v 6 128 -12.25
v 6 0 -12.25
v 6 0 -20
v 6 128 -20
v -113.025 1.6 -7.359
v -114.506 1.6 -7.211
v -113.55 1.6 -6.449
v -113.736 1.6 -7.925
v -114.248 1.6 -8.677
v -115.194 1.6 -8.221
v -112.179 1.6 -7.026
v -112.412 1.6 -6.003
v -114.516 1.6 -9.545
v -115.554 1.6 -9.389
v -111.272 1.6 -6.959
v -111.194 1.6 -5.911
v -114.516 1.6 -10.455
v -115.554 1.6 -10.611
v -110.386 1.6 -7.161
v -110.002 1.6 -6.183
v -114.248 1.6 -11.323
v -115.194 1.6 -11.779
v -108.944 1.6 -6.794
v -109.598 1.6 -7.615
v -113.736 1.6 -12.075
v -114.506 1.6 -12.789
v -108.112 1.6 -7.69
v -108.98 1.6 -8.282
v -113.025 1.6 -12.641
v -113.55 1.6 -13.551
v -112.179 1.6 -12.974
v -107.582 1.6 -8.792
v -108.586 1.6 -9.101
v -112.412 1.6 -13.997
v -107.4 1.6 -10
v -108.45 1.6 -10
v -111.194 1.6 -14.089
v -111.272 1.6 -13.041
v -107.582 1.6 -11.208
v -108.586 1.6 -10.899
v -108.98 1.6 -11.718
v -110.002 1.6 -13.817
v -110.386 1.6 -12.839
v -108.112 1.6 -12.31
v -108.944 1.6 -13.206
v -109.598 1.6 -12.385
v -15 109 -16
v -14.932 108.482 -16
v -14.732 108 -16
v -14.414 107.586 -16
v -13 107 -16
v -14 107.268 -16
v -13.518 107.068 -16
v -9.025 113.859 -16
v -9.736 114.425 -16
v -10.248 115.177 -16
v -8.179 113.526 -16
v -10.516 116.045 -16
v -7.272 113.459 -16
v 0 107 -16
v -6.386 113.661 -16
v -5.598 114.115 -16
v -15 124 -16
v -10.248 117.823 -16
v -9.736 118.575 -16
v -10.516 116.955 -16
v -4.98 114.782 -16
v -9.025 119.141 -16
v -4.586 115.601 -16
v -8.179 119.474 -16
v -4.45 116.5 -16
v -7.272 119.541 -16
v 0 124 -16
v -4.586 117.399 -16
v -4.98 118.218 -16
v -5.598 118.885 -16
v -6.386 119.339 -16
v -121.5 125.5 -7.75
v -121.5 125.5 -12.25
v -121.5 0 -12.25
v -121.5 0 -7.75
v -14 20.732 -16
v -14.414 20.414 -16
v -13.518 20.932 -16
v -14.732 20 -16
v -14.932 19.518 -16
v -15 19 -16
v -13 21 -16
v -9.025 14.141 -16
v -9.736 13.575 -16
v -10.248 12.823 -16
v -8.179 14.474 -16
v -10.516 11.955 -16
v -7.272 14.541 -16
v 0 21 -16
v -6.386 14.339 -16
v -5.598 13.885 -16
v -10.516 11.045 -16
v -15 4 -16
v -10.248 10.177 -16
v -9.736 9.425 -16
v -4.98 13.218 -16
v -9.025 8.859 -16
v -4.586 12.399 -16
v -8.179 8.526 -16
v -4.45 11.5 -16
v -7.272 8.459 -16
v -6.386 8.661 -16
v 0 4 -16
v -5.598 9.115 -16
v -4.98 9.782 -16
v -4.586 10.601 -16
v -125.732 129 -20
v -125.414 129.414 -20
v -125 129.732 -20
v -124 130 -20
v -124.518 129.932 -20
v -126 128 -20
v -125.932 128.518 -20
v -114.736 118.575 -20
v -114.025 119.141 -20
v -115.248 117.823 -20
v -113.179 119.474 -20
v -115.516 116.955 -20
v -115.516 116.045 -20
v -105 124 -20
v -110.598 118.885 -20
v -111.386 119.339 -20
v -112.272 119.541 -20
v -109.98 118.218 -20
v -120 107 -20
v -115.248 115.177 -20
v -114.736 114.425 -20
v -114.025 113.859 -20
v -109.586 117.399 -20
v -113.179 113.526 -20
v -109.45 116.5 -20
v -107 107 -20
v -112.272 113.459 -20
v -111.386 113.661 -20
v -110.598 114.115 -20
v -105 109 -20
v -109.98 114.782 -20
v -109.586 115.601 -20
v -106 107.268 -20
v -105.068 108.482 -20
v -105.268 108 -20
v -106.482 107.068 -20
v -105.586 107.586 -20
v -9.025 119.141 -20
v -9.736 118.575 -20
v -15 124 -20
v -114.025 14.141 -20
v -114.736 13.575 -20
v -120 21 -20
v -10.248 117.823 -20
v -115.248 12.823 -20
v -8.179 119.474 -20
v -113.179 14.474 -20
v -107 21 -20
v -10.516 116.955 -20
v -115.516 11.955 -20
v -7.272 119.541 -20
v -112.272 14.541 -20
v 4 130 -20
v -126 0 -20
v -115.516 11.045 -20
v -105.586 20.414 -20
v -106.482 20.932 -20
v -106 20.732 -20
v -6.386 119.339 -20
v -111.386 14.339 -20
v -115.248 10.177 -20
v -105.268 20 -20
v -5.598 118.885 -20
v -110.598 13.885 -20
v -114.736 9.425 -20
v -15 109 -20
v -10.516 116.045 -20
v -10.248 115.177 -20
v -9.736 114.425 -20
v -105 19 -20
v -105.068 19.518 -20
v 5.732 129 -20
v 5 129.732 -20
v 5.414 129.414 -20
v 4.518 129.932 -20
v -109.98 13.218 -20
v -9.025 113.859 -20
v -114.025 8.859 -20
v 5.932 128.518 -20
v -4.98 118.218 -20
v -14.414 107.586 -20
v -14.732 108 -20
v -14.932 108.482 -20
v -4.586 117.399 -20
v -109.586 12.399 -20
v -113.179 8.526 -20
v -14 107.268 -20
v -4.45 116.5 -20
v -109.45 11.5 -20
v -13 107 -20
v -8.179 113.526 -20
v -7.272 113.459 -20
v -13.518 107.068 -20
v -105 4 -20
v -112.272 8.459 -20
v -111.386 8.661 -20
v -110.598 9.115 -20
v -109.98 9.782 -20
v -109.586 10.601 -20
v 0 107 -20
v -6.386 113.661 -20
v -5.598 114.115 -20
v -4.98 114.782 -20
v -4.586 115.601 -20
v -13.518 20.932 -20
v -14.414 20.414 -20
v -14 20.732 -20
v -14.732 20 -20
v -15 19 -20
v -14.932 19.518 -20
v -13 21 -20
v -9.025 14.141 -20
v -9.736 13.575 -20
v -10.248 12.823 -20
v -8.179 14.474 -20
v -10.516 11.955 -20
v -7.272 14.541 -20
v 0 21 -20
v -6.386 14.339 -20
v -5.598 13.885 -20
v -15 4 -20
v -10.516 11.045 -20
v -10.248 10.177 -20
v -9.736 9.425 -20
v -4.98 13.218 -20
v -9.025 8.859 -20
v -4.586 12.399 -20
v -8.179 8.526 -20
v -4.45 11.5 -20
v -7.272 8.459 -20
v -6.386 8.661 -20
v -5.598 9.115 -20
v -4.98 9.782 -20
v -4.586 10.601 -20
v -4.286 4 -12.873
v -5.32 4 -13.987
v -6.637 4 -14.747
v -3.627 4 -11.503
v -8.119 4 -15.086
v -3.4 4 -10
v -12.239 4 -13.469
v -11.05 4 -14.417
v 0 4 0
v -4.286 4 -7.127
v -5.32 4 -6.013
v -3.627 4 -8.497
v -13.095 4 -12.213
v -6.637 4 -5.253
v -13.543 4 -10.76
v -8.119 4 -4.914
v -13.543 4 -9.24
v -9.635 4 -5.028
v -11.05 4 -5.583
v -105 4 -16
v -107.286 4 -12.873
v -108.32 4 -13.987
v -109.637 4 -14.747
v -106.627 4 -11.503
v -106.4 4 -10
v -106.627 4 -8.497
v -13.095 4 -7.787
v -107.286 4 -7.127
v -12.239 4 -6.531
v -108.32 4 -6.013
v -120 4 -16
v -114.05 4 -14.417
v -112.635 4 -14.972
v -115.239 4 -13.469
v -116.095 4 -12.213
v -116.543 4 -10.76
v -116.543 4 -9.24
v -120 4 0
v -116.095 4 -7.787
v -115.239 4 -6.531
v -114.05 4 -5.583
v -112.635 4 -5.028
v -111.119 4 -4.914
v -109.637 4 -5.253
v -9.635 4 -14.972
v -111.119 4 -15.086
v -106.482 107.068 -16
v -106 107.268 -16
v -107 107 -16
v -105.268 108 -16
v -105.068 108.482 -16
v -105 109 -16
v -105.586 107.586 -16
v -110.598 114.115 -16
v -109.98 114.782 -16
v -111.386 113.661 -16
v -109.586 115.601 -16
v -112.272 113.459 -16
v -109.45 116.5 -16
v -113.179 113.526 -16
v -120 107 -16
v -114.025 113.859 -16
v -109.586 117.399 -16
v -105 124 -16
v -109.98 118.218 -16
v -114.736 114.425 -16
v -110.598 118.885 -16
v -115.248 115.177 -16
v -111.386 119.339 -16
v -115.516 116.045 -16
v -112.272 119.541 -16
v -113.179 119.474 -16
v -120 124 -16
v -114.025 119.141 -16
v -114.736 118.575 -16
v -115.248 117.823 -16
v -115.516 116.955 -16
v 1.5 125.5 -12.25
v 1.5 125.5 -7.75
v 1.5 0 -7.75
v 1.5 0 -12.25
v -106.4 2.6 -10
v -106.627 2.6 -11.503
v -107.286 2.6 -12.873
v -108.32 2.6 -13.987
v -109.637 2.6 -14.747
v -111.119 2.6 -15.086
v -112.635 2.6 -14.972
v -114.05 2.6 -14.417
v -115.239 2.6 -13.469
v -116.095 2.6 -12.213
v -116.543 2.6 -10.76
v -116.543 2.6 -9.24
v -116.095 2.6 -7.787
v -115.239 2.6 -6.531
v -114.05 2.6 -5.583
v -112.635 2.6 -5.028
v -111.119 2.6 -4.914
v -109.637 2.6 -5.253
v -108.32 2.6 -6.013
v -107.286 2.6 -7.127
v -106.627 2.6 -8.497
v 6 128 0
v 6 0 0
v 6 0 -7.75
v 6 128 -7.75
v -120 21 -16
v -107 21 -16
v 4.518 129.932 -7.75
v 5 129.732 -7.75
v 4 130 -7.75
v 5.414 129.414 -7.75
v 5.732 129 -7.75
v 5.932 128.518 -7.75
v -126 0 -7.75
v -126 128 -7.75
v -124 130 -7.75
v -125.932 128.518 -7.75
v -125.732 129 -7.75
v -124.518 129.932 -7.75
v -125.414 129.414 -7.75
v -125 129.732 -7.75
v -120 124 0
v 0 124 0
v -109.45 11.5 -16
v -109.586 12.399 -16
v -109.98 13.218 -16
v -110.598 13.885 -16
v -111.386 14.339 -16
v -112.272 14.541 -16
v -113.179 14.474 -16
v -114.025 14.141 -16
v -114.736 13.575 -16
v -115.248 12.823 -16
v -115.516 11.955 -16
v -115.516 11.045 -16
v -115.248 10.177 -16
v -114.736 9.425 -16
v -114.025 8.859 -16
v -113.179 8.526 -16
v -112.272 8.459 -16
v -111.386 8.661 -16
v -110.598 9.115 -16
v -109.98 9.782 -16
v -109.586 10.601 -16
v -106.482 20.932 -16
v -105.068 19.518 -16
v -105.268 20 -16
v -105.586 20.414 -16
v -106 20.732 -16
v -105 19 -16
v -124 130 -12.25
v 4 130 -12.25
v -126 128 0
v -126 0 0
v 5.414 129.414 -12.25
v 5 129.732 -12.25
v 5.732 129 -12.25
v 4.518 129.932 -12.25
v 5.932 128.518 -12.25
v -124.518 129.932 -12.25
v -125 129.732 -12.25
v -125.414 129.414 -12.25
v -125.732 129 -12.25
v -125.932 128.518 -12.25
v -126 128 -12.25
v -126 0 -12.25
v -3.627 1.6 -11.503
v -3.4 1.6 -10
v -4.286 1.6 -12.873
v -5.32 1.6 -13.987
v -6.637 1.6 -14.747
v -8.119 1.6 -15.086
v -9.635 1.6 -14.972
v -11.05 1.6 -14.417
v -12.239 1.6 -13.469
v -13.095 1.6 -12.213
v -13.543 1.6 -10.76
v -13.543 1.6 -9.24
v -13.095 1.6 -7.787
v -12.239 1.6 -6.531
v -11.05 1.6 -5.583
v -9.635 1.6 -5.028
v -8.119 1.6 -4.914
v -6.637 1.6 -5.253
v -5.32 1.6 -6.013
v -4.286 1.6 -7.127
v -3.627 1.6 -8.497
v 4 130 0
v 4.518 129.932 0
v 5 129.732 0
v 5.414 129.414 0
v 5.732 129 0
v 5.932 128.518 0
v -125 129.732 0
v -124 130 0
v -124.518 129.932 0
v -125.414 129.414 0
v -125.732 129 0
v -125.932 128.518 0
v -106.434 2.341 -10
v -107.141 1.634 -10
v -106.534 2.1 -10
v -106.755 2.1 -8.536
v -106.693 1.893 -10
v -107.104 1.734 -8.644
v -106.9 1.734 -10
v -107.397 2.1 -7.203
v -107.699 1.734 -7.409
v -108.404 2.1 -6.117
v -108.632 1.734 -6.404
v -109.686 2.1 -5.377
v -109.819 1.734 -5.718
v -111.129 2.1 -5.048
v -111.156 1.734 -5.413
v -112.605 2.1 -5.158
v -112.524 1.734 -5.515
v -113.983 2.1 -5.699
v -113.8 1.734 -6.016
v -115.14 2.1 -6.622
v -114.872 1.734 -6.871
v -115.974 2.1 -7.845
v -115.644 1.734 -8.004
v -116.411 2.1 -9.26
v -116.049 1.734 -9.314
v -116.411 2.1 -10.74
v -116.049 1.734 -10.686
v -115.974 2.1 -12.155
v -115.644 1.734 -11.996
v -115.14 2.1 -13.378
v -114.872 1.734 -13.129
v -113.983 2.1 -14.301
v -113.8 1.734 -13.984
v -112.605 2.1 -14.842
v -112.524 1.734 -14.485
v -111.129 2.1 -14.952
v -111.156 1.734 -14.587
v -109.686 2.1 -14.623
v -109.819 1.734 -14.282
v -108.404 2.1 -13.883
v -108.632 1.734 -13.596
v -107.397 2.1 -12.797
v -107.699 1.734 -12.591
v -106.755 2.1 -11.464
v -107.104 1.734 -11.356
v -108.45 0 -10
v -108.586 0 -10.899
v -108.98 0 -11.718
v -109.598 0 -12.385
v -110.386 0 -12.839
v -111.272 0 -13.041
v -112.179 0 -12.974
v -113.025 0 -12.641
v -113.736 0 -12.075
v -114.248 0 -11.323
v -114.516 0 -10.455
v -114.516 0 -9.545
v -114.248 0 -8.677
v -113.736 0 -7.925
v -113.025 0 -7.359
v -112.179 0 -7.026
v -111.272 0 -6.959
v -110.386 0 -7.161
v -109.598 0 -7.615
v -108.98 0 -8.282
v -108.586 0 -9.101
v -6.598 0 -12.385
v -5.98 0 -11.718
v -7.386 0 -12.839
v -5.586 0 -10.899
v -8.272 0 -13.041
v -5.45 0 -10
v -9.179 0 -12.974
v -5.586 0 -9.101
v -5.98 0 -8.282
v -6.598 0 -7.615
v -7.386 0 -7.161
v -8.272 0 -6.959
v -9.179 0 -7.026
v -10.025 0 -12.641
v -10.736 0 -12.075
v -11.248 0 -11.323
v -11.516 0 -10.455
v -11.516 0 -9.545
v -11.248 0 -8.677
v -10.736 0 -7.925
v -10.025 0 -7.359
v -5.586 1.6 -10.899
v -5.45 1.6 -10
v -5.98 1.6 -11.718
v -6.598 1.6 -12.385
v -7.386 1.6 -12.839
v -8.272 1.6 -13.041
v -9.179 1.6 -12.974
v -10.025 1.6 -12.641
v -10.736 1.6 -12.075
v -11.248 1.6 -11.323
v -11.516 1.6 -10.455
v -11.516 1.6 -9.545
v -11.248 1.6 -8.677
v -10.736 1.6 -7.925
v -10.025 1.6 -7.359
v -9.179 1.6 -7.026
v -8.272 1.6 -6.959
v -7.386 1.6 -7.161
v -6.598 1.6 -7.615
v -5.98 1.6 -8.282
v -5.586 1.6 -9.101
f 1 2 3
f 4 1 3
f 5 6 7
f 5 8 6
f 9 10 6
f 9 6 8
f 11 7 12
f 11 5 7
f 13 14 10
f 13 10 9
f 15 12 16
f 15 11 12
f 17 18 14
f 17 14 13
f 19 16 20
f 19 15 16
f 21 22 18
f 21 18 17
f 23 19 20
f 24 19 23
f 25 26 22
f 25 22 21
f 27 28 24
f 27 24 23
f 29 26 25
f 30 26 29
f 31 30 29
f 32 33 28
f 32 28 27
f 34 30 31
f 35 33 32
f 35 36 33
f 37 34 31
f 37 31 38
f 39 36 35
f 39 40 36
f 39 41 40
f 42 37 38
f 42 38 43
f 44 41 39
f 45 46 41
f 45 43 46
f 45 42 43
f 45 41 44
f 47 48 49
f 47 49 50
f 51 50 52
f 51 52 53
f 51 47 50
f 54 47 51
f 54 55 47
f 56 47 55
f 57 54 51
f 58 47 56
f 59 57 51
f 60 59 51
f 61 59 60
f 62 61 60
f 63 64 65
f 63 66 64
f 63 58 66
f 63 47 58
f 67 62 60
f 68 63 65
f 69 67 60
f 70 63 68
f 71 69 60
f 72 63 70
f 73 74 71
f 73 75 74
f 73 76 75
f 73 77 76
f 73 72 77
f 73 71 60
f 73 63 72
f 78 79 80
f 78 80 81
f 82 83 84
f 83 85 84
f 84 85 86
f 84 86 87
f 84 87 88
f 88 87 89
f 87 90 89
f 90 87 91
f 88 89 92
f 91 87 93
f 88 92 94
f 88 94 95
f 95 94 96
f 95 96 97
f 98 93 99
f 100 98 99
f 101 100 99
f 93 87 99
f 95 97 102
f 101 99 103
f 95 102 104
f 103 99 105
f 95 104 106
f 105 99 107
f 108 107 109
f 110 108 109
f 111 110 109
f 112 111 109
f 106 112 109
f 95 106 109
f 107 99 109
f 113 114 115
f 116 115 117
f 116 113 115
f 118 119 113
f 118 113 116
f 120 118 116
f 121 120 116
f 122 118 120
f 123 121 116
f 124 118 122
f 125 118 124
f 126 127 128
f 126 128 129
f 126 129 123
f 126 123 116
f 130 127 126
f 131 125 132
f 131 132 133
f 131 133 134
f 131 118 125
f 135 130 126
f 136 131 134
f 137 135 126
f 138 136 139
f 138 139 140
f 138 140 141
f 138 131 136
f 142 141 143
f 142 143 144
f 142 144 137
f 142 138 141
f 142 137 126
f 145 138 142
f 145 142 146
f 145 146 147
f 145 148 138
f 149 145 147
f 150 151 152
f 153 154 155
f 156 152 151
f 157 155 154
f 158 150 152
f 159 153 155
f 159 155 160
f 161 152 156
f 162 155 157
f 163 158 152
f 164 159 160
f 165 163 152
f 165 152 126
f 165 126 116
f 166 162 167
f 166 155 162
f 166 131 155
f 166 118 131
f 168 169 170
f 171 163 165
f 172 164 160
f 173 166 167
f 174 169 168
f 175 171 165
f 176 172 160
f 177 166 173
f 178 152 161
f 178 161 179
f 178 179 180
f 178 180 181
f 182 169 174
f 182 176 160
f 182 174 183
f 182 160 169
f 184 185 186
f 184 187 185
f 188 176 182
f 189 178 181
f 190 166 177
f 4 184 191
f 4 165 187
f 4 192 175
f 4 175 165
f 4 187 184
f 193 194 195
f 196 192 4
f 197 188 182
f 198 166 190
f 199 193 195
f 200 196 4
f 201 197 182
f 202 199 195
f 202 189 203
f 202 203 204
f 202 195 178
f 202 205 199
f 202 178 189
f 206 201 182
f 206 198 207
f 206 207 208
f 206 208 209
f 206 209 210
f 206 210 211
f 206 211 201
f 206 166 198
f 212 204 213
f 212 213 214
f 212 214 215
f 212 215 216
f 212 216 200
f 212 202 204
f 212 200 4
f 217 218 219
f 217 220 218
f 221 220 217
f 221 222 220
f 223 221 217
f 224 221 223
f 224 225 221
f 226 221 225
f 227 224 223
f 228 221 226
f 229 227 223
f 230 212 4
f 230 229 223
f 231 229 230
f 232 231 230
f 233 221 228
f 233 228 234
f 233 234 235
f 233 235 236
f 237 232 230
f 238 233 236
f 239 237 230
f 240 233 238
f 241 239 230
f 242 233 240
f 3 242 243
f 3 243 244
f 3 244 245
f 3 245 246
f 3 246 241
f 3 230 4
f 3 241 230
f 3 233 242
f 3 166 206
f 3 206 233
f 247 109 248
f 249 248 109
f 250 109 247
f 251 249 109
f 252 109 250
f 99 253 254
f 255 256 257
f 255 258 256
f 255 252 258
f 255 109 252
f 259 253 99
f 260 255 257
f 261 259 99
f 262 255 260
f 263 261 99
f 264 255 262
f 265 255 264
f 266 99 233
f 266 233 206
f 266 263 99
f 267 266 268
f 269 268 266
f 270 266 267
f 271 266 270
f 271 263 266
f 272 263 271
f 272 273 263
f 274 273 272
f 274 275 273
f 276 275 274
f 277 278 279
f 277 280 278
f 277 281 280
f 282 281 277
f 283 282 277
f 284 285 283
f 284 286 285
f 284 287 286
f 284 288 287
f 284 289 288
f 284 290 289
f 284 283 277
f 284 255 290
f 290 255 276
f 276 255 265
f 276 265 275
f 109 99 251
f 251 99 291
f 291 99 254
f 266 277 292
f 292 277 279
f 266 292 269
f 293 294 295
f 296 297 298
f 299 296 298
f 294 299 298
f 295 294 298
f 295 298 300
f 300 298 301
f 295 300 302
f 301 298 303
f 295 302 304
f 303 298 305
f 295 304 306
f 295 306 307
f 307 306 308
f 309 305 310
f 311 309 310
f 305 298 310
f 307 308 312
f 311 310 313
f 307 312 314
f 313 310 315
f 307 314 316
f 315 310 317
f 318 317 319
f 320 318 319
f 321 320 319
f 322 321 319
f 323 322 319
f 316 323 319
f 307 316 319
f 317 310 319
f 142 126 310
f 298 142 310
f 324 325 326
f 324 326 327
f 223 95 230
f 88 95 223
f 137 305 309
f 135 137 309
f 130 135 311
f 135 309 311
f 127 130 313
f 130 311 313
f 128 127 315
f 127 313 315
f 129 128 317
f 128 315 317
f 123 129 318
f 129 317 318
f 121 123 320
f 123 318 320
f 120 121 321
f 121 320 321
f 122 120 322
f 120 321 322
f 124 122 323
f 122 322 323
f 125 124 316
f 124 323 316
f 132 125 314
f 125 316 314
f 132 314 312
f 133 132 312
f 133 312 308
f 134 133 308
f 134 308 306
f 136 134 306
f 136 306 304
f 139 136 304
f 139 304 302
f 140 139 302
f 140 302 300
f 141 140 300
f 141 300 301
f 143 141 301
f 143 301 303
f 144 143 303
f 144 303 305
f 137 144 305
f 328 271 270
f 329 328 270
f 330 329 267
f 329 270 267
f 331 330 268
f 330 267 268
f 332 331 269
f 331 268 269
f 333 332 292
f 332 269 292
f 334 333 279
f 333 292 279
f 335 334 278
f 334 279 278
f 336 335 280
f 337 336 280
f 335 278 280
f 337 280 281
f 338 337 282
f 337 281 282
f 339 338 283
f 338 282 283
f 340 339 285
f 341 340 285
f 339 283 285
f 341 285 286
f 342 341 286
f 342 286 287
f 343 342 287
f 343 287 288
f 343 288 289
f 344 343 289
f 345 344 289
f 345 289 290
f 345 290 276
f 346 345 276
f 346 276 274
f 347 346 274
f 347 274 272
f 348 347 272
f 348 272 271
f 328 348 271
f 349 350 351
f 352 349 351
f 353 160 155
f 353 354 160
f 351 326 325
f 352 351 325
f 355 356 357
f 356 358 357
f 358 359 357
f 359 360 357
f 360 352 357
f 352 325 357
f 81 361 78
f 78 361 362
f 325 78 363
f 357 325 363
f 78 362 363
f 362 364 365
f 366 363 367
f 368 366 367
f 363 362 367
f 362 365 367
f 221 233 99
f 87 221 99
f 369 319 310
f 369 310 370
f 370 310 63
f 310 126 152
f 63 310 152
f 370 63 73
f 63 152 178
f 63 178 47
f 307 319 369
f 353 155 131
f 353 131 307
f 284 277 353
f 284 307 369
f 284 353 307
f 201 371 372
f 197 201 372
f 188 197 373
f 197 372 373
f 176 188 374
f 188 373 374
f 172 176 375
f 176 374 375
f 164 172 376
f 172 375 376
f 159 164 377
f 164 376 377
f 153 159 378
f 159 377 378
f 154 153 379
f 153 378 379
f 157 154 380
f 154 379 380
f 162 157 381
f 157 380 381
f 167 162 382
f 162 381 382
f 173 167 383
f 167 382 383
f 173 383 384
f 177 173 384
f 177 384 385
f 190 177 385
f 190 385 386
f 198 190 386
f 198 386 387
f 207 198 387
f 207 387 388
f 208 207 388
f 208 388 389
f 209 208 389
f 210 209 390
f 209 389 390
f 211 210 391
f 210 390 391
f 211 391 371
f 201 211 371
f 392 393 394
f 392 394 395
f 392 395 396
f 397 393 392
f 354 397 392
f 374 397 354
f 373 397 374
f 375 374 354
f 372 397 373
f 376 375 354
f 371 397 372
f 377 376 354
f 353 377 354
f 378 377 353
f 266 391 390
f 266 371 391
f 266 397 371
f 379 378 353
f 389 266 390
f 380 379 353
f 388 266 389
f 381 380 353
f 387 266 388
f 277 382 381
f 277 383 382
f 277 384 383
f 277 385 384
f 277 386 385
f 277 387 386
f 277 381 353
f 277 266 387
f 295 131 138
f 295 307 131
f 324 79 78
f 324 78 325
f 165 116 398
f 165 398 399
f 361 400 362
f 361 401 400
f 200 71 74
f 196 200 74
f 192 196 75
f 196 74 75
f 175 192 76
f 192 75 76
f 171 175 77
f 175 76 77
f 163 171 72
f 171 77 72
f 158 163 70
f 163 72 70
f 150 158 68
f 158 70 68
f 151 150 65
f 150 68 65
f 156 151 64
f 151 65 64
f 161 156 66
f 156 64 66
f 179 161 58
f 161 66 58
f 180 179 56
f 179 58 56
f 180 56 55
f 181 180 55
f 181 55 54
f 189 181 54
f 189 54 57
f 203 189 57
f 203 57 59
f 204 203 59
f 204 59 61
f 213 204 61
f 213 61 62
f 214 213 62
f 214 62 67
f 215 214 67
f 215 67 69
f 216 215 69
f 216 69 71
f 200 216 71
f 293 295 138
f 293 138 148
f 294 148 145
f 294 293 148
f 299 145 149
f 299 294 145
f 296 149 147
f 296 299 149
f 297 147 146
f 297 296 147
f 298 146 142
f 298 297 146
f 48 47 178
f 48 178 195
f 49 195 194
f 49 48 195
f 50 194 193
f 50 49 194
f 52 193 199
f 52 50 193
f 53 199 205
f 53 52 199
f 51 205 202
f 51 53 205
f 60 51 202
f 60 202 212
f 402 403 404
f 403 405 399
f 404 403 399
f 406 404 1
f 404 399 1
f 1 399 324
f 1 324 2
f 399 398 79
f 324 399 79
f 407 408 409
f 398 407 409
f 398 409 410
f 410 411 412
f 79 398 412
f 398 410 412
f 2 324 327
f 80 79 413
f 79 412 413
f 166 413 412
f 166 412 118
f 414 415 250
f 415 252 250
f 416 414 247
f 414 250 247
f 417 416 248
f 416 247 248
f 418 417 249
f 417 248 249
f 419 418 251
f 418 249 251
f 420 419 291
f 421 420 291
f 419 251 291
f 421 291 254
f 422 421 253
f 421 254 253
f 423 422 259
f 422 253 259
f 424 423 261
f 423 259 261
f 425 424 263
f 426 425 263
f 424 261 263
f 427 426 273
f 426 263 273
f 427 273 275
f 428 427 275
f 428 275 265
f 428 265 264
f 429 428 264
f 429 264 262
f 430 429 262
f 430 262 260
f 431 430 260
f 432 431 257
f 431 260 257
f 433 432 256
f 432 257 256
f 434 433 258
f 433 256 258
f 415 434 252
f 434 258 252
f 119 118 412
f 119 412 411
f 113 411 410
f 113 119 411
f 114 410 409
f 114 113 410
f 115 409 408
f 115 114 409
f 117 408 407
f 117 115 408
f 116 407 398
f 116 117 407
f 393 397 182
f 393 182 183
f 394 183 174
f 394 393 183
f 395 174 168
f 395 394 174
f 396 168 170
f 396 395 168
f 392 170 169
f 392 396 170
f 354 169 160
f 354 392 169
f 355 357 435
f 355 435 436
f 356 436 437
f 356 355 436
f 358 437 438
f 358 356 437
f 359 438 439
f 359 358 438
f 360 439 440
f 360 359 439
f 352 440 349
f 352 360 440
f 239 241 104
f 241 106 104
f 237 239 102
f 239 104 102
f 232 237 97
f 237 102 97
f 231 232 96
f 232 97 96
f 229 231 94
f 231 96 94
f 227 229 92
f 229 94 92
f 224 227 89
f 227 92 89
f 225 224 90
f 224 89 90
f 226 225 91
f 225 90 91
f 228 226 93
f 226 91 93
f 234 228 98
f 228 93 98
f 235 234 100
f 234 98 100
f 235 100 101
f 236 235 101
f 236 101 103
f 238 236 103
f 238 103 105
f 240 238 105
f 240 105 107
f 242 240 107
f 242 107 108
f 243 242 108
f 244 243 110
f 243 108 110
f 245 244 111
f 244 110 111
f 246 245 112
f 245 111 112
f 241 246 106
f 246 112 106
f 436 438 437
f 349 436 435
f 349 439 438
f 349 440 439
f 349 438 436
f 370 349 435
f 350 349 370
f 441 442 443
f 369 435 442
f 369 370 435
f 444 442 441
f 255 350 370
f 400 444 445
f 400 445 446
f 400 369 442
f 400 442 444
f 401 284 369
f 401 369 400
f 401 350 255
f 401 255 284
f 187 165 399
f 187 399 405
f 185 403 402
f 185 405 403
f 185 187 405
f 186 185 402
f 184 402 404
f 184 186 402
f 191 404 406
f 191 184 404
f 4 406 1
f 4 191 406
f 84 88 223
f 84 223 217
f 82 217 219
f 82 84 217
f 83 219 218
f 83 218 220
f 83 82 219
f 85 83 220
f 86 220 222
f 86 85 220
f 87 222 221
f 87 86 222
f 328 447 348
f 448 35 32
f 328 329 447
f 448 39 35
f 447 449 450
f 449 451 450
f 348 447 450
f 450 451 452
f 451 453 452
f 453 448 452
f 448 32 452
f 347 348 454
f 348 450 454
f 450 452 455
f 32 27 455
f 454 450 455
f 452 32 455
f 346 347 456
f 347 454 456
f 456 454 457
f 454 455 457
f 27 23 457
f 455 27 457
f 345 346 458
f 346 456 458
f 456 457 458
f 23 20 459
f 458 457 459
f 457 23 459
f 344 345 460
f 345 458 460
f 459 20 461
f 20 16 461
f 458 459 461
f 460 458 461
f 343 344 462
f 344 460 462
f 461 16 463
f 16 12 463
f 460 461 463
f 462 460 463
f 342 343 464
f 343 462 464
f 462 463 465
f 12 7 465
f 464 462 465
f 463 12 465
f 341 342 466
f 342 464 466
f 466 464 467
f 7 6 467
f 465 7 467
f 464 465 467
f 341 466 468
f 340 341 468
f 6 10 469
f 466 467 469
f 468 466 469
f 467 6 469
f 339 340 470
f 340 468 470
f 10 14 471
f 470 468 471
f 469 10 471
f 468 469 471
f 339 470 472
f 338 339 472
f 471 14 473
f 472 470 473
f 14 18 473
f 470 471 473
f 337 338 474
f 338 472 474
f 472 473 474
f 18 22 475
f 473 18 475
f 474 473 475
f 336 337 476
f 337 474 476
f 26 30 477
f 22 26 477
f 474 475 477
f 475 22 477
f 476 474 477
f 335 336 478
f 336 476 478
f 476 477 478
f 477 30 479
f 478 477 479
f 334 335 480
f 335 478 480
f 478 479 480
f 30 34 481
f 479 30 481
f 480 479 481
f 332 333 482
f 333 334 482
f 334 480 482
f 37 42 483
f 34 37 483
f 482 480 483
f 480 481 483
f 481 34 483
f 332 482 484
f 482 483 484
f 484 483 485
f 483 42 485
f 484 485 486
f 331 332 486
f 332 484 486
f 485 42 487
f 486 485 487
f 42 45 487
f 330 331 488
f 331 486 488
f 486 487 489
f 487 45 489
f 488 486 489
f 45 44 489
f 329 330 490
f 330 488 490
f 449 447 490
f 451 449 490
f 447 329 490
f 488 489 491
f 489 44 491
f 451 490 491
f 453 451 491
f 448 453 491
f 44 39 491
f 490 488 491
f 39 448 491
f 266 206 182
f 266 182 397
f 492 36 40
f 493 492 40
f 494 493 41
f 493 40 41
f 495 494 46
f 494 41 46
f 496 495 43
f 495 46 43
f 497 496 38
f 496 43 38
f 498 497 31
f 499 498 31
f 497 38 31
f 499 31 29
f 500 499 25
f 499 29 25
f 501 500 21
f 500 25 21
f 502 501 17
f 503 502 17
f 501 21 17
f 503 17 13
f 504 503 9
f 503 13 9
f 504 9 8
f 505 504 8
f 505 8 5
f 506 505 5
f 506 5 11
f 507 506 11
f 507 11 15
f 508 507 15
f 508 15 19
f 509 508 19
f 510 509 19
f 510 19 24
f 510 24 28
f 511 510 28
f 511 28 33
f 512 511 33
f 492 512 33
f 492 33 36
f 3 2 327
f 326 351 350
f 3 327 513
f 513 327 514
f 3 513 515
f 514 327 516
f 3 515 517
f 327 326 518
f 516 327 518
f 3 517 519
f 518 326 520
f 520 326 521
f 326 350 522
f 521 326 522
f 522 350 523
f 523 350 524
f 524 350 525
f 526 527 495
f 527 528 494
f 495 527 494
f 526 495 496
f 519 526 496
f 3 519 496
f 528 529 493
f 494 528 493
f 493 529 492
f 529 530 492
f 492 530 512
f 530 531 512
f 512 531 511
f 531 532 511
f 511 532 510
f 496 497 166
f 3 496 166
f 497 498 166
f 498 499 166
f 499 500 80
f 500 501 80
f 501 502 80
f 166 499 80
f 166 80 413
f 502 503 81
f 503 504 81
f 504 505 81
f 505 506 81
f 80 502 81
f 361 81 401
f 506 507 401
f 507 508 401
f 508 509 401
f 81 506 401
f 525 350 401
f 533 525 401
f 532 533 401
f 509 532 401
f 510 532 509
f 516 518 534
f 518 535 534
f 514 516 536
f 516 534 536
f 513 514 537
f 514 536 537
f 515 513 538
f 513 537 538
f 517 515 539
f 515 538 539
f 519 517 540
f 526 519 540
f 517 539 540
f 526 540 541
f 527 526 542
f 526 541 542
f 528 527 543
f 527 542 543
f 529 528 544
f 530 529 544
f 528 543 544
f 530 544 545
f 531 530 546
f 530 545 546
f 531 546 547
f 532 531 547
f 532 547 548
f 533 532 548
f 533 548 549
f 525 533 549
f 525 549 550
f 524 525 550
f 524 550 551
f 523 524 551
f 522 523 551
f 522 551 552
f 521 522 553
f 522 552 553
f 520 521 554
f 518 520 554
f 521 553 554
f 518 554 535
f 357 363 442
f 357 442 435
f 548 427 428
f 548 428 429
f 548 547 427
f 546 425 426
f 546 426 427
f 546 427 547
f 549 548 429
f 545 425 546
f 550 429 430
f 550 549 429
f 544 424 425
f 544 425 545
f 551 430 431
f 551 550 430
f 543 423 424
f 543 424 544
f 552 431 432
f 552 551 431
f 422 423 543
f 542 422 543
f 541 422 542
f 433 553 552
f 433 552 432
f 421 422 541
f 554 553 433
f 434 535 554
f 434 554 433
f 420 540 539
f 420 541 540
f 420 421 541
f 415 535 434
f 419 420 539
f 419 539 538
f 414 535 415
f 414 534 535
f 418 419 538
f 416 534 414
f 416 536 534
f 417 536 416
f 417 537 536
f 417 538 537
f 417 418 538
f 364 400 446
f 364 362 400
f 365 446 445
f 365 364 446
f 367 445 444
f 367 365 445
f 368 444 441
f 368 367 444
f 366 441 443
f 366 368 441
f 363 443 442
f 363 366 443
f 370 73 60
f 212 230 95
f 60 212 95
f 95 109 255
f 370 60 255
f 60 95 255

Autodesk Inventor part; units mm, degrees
ref_plane "YZ Plane" through (0, 0, 0) normal (1, 0, 0) x (0, 1, 0)
ref_plane "XZ Plane" through (0, 0, 0) normal (0, 1, 0) x (-1, 0, 0)
ref_plane "XY Plane" through (0, 0, 0) normal (0, 0, 1) x (1, 0, 0)
sketch "Эскиз1" plane through (0, 0, 0) normal (0, 1, 0) x (-1, 0, 0)
  line L0 (0, 0) -> (120, 0)
  line L1 (120, 0) -> (120, -20)
  line L2 (120, -20) -> (0, -20)
  line L3 (0, -20) -> (0, 0)
  dimension "d0" = 20
  dimension "d1" = 120
sketch "Эскиз2" plane through (0, 0, 0) normal (0, 1, 0) x (-1, 0, 0)
  line L0 (0, -20) -> (15, -20)
  line L1 (15, -20) -> (15, -16)
  line L2 (15, -16) -> (0, -16)
  line L3 (0, -16) -> (0, -20)
  line L4 (120, -20) -> (105, -20)
  line L5 (105, -20) -> (105, -16)
  line L6 (105, -16) -> (120, -16)
  line L7 (120, -16) -> (120, -20)
  point P0 (0, 0)
  dimension "d2" = 15
  dimension "d3" = 4
  dimension "d39" = 15
  dimension "d40" = 90
  dimension "d41" = 16
  dimension "d42" = 4
  dimension "d43" = 15
  dimension "d44" = 16
extrude "Выдавливание1" add sketch "Эскиз1" along normal blind 4
sketch "Эскиз3" plane through (0, 4, 0) normal (0, 1, 0) x (1, 0, 0)
  circle A0 centre (-111.5, 10) radius 3.05
  line L0 (-120, 0) -> (0, 0) projected
  line L1 (-120, 20) -> (-120, 0) projected
  circle A1 centre (-8.5, 10) radius 3.05
  line L2 (0, 0) -> (0, 20) projected
  point P0 (0, 16)
  dimension "d9" = 6.1
  dimension "d14" = 10
  dimension "d27" = 8.5
  dimension "d28" = 6.1
  dimension "d29" = 8.5
  dimension "d30" = 10
sketch "Эскиз4" plane through (0, 4, 0) normal (0, 1, 0) x (1, 0, 0)
  circle A0 centre (-8.5, 10) radius 5.1
  line L0 (-120, 0) -> (0, 0) projected
  line L1 (0, 0) -> (0, 20) projected
  circle A1 centre (-111.5, 10) radius 5.1
  line L2 (-120, 20) -> (-120, 0) projected
  point P0 (0, 16)
  dimension "d11" = 10.2
  dimension "d12" = 10
  dimension "d33" = 8.5
  dimension "d34" = 10.2
  dimension "d35" = 8.5
  dimension "d36" = 10
extrude "Выдавливание6" cut sketch "Эскиз3" against normal blind 10
extrude "Выдавливание7" cut sketch "Эскиз4" against normal blind 2.4
extrude "Выдавливание8" add sketch "Эскиз2" along normal blind 21
sketch "Эскиз6" plane through (-120, 4, -16) normal (0, 0, 1) x (1, 0, 0)
  circle A0 centre (7.5, 7.5) radius 3.05
  circle A1 centre (112.5, 7.5) radius 3.05
  line L0 (0, 0) -> (120, 0) projected
  line L1 (0, 0) -> (0, 17) projected
  line L2 (105, 0) -> (105, 17) projected
  line L3 (120, 0) -> (120, 17) projected
  point P0 (120, -4)
  point P1 (0, 15)
  point P2 (105, 15)
  point P3 (120, 15)
  dimension "d48" = 6.1
  dimension "d49" = 6.1
  dimension "d50" = 7.5
  dimension "d51" = 7.5
  dimension "d53" = 7.5
  dimension "d66" = 7.5
sketch "Эскиз7" plane through (-17, 4, -20) normal (0, 0, 1) x (1, 0, 0)
  circle A0 centre (9.5, 7.5) radius 5.1
  circle A1 centre (-95.5, 7.5) radius 5.1
  line L0 (-103, 0) -> (17, 0) projected
  line L1 (-88, 0) -> (-88, 17) projected
  line L2 (17, 0) -> (17, 17) projected
  line L3 (-103, -4) -> (-103, 17) projected
  point P0 (17, -4)
  point P1 (-88, 15)
  point P2 (17, 15)
  point P3 (-103, 15)
  dimension "d54" = 10.2
  dimension "d55" = 10.2
  dimension "d56" = 7.5
  dimension "d58" = 7.5
  dimension "d59" = 7.5
  dimension "d67" = 7.5
extrude "Выдавливание9" cut sketch "Эскиз6" against normal blind 21
fillet "Сопряжение4" radius 1 1 edges at (-116.6, 1.6, -10)
sketch "Эскиз8" plane through (-120, 0, 0) normal (0, 0, 1) x (1, 0, 0)
  point P0 (120, 0)
sketch "Эскиз9" plane through (0, 0, 0) normal (0, -1, 0) x (1, 0, 0)
  line L0 (-120, 0) -> (0, 0) projected
  line L1 (0, 0) -> (6, 0)
  line L2 (6, 0) -> (6, -20)
  line L3 (6, -20) -> (0, -20)
  line L4 (0, -20) -> (0, 0)
  line L5 (-120, 0) -> (-126, 0)
  line L6 (-126, 0) -> (-126, -20)
  line L7 (-126, -20) -> (-120, -20)
  line L8 (-120, -20) -> (-120, 0)
  dimension "d68" = 6
  dimension "d69" = 6
  dimension "d70" = 20
  dimension "d71" = 120
  dimension "d72" = 20
extrude "Выдавливание11" add sketch "Эскиз9" against normal blind 124
sketch "Эскиз10" plane through (0, 124, 0) normal (0, 1, 0) x (1, 0, 0)
  line L0 (6, 0) -> (6, 20) projected
  line L1 (-126, 20) -> (6, 20) projected
  line L2 (6, 0) -> (-126, 0)
  line L3 (-126, 0) -> (-126, 20)
  line L4 (-126, 20) -> (6, 20)
  line L5 (6, 20) -> (6, 0)
  point P0 (0, 0)
extrude "Выдавливание12" add sketch "Эскиз10" along normal blind 6
sketch "Эскиз11" plane through (-126, 0, -20) normal (-1, 0, 0) x (0, 0, 1)
  line L0 (0, 0) -> (20, 0) projected
  line L1 (0, 130) -> (20, 130) projected
  line L2 (7.75, 0) -> (12.25, 0)
  line L3 (12.25, 0) -> (12.25, 130)
  line L4 (12.25, 130) -> (7.75, 130)
  line L5 (7.75, 130) -> (7.75, 0)
  line L6 (20, 0) -> (20, 130) projected
  dimension "d77" = 4.5
  dimension "d78" = 7.75
sketch "Эскиз12" plane through (6, 0, 0) normal (1, 0, 0) x (0, 0, -1)
  line L0 (20, 0) -> (0, 0) projected
  line L1 (20, 130) -> (0, 130) projected
  line L2 (7.75, 0) -> (12.25, 0)
  line L3 (12.25, 0) -> (12.25, 130)
  line L4 (12.25, 130) -> (7.75, 130)
  line L5 (7.75, 130) -> (7.75, 0)
  line L6 (20, 0) -> (20, 130) projected
  dimension "d79" = 4.5
  dimension "d80" = 7.75
extrude "Выдавливание13" cut sketch "Эскиз11" against normal blind 4.5 contours L5 L1 L3 L0
extrude "Выдавливание14" cut sketch "Эскиз12" against normal blind 4.5 contours L0 L5 L1 L3
sketch "Эскиз13" plane through (0, 130, 0) normal (0, 1, 0) x (1, 0, 0)
  line L0 (-121.5, 12.25) -> (-121.5, 7.75) projected
  line L1 (1.5, 7.75) -> (1.5, 12.25) projected
  line L2 (-121.5, 7.75) -> (1.5, 7.75)
  line L3 (1.5, 7.75) -> (1.5, 12.25)
  line L4 (1.5, 12.25) -> (-121.5, 12.25)
  line L5 (-121.5, 12.25) -> (-121.5, 7.75)
  point P0 (0, 0)
extrude "Выдавливание15" cut sketch "Эскиз13" against normal blind 4.5
sketch "Эскиз15" plane through (0, 124, 0) normal (0, -1, 0) x (1, 0, 0)
  line L0 (0, -20) -> (-120, -20) projected
  line L1 (-120, -20) -> (-105, -20)
  line L2 (-105, -20) -> (-105, -16)
  line L3 (-105, -16) -> (-120, -16)
  line L4 (-120, -16) -> (-120, -20)
  line L5 (0, -20) -> (-15, -20)
  line L6 (-15, -20) -> (-15, -16)
  line L7 (-15, -16) -> (0, -16)
  line L8 (0, -16) -> (0, -20)
  point P0 (0, 0)
  dimension "d87" = 15
  dimension "d88" = 4
  dimension "d89" = 15
  dimension "d90" = 4
extrude "Выдавливание16" add sketch "Эскиз15" along normal blind 17
sketch "Эскиз16" plane through (-120, 124, -16) normal (0, 0, 1) x (1, 0, 0)
  circle A0 centre (7.5, -7.5) radius 3.05
  circle A1 centre (112.5, -7.5) radius 3.05
  line L0 (0, -17) -> (0, 0) projected
  line L1 (0, 0) -> (15, 0) projected
  line L2 (105, 0) -> (120, 0) projected
  line L3 (120, 0) -> (120, -17) projected
  point P0 (120, -124)
  dimension "d93" = 6.1
  dimension "d94" = 6.1
  dimension "d95" = 7.5
  dimension "d96" = 7.5
  dimension "d97" = 7.5
  dimension "d98" = 7.5
extrude "Выдавливание17" cut sketch "Эскиз16" against normal blind 17
sketch "Эскиз17" plane through (6, 0, -20) normal (0, 0, -1) x (-1, 0, 0)
  circle A0 centre (13.5, 116.5) radius 5.1
  circle A1 centre (118.5, 116.5) radius 3.05 projected
  circle A2 centre (118.5, 116.5) radius 5.1
  line L0 (21, 124) -> (21, 107) projected
  line L1 (21, 124) -> (111, 124) projected
  line L2 (111, 124) -> (111, 107) projected
  point P0 (6, 0)
  dimension "d101" = 10.2
  dimension "d102" = 10.2
  dimension "d103" = 7.5
  dimension "d104" = 7.5
  dimension "d105" = 7.5
  dimension "d106" = 7.5
fillet "Сопряжение9" radius 2 8 edges at (-105, 107, -18) (-105, 21, -18) (-15, 107, -18) (-15, 21, -18) (6, 130, -3.875) (6, 130, -16.125) (-126, 130, -3.875) (-126, 130, -16.125)
properties part number "КрепежКулера"
